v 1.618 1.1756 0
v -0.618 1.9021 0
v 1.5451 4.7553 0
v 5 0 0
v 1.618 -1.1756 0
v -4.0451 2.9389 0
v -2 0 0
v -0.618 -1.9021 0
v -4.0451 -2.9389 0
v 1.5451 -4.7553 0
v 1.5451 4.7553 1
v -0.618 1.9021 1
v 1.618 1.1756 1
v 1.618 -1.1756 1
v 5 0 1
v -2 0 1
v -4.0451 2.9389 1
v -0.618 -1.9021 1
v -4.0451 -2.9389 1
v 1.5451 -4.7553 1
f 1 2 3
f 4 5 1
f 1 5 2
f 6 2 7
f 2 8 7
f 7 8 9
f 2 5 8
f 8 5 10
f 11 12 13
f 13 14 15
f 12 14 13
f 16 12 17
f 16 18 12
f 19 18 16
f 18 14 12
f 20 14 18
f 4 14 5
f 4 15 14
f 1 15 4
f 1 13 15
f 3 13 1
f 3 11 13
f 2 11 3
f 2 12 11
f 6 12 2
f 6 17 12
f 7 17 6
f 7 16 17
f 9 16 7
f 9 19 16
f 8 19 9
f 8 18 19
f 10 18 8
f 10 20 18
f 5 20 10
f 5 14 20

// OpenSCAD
// concave polygon from a list comprehension
star = [for (i = [0:9]) let (r = i % 2 == 0 ? 5 : 2, a = i * 36) [r * cos(a), r * sin(a)]];
linear_extrude(1) polygon(star);
